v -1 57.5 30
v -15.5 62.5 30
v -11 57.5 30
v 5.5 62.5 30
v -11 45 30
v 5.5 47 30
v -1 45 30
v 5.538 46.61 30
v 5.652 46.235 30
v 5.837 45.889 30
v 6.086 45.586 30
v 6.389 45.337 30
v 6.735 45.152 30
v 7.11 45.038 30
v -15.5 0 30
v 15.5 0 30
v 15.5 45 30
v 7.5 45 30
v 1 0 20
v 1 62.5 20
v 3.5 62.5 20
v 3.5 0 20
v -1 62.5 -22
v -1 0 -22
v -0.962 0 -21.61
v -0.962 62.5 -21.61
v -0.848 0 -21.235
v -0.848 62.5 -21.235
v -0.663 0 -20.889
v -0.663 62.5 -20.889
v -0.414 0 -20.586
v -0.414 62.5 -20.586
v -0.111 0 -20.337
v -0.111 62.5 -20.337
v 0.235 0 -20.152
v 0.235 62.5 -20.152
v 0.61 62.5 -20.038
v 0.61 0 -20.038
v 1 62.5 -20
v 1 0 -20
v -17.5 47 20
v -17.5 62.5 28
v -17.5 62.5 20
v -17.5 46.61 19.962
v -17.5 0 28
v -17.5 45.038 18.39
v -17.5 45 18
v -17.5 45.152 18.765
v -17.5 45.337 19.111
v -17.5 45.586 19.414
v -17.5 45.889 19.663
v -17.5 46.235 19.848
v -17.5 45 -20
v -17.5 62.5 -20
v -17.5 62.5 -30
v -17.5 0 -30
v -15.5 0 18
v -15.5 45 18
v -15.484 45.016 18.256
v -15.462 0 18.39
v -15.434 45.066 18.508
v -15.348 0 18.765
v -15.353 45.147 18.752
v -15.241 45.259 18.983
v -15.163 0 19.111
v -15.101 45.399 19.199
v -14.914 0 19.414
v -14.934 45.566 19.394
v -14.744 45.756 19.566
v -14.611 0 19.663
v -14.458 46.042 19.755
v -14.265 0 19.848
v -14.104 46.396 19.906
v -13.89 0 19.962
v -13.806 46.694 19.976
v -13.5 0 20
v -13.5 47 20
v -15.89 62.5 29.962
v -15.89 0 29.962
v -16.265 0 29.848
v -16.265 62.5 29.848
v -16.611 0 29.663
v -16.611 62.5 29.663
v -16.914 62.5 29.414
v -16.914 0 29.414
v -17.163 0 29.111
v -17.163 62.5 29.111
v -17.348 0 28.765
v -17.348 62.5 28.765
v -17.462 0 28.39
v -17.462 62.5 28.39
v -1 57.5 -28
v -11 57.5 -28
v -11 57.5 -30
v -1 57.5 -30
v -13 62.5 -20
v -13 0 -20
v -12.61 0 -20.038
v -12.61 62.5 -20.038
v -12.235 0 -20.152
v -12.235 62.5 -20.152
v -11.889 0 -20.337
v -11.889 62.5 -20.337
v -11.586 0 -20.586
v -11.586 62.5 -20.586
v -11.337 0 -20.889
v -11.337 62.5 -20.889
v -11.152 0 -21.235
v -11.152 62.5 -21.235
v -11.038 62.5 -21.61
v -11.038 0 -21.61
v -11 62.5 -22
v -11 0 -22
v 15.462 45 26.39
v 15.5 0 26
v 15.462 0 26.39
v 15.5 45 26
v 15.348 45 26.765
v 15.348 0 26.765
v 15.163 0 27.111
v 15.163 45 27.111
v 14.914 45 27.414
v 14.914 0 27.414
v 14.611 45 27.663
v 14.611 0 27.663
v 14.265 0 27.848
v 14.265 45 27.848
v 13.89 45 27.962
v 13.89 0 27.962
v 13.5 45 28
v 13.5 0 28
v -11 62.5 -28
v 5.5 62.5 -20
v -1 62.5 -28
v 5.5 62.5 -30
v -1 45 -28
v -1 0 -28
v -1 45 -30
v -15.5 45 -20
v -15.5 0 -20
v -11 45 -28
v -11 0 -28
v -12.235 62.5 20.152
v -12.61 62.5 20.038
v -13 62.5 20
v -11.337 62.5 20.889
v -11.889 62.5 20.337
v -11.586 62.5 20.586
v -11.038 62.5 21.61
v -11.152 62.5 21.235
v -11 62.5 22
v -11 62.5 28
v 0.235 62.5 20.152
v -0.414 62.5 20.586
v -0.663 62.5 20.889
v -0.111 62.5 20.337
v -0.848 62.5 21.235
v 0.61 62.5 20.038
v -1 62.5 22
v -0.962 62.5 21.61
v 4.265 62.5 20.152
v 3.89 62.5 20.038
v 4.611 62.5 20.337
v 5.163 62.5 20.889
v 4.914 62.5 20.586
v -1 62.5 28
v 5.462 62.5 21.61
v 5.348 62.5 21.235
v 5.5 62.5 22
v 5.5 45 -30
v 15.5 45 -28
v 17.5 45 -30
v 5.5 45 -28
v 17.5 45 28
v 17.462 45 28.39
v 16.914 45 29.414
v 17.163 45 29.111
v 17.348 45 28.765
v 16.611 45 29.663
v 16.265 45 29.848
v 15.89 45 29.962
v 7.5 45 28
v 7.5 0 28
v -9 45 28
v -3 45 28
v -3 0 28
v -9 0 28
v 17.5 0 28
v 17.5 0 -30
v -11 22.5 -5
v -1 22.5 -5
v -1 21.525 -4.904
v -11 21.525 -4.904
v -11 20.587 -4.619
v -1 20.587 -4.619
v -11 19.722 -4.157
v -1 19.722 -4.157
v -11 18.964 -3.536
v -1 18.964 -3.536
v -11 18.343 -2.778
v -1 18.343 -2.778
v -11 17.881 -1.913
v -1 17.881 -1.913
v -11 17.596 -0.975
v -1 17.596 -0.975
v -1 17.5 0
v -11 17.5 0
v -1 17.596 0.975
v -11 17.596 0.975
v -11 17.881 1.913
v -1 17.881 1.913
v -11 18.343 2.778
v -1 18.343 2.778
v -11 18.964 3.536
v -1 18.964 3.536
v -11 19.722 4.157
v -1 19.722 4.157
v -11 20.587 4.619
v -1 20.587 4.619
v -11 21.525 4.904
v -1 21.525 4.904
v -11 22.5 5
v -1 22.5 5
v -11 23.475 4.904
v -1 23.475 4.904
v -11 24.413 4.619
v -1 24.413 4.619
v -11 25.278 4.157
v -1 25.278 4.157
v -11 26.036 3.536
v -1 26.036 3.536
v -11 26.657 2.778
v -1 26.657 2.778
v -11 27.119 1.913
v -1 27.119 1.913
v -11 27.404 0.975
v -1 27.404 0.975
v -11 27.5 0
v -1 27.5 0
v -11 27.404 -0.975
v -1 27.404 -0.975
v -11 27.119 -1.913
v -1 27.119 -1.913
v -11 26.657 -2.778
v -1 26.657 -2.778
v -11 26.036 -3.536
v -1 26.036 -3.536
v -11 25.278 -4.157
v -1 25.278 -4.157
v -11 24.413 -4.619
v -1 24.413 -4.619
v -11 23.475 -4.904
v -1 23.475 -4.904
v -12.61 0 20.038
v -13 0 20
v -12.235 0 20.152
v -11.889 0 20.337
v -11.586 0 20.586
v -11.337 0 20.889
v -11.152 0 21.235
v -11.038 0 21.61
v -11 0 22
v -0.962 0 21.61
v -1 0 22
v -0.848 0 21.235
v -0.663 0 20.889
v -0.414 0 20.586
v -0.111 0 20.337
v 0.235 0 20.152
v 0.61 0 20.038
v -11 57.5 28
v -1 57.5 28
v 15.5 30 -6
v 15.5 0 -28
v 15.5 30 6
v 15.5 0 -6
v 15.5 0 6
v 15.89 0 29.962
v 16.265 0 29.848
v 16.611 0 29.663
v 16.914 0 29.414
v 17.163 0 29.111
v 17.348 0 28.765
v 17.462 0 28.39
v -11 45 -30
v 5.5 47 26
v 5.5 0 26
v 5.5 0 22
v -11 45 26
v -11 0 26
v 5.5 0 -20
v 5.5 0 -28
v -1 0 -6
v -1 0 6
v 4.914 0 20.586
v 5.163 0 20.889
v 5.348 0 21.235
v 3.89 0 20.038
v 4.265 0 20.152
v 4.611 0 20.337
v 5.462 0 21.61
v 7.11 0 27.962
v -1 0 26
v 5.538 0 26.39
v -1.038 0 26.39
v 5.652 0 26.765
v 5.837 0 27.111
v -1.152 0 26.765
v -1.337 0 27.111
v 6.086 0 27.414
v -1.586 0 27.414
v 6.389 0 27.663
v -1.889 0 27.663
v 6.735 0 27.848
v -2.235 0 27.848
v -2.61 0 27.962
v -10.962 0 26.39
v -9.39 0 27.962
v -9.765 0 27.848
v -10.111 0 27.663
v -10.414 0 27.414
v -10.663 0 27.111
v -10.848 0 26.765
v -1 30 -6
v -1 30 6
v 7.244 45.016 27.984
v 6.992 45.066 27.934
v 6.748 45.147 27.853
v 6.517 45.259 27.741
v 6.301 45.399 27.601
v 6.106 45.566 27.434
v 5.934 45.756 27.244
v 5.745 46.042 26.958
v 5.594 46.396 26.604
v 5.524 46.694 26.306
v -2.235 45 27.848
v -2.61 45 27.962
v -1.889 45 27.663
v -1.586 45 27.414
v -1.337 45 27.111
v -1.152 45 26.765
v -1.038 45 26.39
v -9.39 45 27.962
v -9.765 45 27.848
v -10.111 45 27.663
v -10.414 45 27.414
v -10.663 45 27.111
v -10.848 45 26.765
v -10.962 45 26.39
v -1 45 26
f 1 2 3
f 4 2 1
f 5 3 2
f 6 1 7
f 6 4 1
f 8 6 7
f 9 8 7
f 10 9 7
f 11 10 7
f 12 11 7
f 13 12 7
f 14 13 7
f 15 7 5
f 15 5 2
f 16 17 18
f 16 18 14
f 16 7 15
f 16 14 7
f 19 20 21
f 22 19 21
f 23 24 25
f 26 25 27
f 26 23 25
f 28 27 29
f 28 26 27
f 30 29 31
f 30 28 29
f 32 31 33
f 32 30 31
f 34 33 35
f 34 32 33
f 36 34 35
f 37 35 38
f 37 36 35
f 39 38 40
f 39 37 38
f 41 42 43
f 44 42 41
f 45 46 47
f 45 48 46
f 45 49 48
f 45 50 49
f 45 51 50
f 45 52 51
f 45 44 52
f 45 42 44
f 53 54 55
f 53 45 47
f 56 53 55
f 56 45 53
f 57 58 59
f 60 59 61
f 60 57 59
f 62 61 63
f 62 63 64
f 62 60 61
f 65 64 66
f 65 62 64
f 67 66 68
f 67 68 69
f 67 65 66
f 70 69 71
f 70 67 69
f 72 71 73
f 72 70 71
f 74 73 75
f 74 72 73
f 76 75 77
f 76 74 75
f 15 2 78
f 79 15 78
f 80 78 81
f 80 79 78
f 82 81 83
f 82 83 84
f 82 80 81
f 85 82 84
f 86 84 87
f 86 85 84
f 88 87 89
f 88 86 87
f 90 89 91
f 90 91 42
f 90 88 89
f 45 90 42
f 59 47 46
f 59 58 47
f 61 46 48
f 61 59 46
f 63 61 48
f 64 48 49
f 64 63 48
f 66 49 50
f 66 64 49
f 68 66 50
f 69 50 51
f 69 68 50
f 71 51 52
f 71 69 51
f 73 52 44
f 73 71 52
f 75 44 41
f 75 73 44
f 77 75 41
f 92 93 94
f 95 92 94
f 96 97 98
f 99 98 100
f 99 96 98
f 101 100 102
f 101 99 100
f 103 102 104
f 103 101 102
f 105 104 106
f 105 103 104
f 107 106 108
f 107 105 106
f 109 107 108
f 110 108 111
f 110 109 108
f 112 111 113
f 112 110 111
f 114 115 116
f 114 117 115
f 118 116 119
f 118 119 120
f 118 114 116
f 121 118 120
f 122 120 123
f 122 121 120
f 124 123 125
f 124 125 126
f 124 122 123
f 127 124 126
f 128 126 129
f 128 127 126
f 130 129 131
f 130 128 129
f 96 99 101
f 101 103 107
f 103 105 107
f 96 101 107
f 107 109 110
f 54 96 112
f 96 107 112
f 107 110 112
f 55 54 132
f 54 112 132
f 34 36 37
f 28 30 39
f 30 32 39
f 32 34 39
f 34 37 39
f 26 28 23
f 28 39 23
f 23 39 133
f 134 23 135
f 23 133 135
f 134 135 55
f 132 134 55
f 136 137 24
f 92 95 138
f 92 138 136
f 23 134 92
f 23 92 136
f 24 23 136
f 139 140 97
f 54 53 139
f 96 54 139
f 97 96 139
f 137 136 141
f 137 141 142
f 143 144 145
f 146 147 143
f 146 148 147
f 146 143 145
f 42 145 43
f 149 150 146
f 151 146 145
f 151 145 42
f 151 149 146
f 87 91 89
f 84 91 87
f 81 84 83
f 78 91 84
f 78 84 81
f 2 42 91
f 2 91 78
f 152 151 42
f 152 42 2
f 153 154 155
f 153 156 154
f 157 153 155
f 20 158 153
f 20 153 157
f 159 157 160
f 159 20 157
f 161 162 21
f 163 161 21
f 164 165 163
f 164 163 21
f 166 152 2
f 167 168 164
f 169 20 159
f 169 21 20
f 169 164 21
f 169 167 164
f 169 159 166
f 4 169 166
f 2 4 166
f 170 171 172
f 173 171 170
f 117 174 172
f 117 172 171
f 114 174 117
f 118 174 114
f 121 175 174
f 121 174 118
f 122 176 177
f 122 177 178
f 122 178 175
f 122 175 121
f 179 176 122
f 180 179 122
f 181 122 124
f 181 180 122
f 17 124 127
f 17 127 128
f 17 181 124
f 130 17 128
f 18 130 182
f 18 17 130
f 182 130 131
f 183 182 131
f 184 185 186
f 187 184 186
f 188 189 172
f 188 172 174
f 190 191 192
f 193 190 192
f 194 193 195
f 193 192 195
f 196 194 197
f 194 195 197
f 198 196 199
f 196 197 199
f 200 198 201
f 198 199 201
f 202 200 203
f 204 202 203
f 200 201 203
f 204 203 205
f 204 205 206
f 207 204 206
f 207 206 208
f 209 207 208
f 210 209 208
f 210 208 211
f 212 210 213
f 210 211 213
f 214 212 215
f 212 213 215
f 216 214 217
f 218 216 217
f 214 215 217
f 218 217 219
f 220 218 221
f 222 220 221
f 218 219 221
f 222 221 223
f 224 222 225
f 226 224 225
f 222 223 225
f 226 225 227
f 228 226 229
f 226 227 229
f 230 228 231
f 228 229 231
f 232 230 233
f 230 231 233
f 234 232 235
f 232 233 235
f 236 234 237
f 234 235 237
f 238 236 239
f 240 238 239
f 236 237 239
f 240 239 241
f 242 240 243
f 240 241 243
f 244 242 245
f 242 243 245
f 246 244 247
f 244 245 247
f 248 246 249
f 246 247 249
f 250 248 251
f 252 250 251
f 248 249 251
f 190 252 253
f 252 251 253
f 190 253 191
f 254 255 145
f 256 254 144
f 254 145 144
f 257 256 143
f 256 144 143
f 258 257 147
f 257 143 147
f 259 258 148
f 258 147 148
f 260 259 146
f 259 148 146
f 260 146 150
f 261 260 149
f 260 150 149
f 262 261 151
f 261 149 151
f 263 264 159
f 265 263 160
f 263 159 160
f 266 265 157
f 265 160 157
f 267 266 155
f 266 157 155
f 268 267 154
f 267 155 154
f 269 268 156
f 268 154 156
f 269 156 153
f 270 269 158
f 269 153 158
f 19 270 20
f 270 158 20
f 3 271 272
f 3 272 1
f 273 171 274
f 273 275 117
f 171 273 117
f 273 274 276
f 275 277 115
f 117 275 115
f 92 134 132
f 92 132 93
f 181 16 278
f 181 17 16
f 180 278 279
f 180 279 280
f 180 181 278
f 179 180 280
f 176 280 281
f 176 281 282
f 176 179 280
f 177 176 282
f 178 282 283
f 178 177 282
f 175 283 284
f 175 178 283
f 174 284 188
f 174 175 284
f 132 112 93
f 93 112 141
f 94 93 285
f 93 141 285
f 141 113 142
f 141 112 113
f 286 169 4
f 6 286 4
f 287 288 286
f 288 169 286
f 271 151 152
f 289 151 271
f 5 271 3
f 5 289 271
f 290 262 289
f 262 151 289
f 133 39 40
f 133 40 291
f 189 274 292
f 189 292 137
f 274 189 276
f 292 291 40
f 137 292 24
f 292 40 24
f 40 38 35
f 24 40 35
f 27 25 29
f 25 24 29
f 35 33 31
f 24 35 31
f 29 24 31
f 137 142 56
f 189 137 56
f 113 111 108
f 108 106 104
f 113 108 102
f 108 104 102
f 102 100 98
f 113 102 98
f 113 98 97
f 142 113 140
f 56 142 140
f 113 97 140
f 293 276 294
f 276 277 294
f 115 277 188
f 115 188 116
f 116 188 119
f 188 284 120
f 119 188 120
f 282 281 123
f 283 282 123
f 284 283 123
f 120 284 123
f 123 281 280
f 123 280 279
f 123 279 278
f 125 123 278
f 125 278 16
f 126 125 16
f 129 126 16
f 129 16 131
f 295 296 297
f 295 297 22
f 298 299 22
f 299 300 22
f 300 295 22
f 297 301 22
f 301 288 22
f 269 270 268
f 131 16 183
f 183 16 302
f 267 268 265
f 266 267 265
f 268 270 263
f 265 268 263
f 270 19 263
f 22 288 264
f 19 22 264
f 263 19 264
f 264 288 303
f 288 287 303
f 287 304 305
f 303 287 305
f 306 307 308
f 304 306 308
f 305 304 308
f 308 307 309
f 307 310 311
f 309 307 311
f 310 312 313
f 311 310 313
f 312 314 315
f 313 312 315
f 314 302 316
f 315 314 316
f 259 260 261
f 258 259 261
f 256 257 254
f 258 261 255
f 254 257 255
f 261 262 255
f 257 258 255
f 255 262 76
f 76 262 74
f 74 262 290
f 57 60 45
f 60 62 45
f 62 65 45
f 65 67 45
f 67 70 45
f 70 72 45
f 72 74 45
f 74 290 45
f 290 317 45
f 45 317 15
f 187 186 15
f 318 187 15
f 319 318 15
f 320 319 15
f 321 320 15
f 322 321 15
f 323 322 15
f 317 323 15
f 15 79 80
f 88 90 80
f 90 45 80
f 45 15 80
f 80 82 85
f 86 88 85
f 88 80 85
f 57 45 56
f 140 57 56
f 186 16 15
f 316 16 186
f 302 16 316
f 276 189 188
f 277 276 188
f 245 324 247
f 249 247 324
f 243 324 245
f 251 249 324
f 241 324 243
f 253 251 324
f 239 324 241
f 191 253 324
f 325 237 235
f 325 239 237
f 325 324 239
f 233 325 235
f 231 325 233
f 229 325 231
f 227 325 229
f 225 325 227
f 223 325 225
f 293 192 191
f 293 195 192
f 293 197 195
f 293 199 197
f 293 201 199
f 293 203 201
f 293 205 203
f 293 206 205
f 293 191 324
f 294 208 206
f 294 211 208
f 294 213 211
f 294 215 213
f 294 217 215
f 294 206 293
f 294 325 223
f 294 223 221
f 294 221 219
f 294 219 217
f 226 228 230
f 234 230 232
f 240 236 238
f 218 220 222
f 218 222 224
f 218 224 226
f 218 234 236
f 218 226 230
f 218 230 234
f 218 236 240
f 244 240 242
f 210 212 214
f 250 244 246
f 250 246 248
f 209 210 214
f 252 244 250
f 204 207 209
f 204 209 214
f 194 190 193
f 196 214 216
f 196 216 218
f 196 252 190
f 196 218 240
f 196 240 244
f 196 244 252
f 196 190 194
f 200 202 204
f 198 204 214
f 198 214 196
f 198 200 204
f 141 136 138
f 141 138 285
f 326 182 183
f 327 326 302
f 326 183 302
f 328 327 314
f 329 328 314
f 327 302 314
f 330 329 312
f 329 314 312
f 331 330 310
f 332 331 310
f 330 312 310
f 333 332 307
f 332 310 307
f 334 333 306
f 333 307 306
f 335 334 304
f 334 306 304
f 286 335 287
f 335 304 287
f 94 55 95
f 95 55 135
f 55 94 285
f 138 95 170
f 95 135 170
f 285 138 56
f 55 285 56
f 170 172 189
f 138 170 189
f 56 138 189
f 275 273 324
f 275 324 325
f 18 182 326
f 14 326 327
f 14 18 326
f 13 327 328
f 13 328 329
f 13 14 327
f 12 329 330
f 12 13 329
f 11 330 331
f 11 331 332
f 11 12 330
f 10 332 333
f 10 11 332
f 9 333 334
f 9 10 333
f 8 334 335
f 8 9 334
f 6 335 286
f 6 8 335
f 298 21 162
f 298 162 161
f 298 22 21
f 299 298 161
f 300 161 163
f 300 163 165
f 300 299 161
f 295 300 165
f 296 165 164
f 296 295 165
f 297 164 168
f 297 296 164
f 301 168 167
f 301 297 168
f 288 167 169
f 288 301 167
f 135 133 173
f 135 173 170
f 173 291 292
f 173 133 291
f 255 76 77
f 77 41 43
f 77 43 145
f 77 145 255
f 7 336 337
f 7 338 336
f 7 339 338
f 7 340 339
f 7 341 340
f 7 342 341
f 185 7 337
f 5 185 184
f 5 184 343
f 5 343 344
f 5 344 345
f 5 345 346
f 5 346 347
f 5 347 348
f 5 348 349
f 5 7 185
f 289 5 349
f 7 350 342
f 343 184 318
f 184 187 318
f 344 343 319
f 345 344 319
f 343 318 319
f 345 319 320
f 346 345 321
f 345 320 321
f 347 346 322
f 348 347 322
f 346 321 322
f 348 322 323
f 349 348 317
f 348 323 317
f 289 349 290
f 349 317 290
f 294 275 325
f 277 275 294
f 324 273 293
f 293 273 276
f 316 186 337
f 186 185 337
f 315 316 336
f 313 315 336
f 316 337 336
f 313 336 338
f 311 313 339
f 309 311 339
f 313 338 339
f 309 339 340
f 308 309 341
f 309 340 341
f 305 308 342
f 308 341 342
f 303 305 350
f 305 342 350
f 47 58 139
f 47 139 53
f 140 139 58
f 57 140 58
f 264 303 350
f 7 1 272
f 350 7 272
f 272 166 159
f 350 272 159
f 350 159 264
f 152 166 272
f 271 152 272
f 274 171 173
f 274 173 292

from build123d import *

# Parameters (mm, degrees)
SKETCH1_W           = 35
SKETCH1_H           = 60
SKETCH1_W_2         = 31
SKETCH1_H_2         = 56
BOSS_EXTRUDE1_DEPTH = 45
SKETCH2_W           = 30
SKETCH2_H           = 12
BOSS_EXTRUDE2_DEPTH = 16.5
SKETCH3_R           = 5
BOSS_EXTRUDE3_DEPTH = 10
SKETCH4_W           = 6.5
SKETCH4_H           = 2
BOSS_EXTRUDE4_DEPTH = 17.5
BOSS_EXTRUDE5_REACH = 73.753
SKETCH5_W           = 5
SKETCH5_H           = 2
BOSS_EXTRUDE6_REACH = 73.502
FILLET1_R           = 2


with BuildPart() as part:
    # Sketch1 → Boss-Extrude1 (new body)
    with BuildSketch(Plane(origin=(0, 0, 0), x_dir=(-1, 0, 0), z_dir=(0, 1, 0))):
        Rectangle(SKETCH1_W, SKETCH1_H)
        Rectangle(SKETCH1_W_2, SKETCH1_H_2, mode=Mode.SUBTRACT)
    extrude(amount=BOSS_EXTRUDE1_DEPTH)

    # Sketch2 → Boss-Extrude2 (add)
    with BuildSketch(Plane(origin=(15.5, 0, 0), x_dir=(0, -1, 0), z_dir=(-1, 0, 0))):
        with Locations((-15, 0)):
            Rectangle(SKETCH2_W, SKETCH2_H)
    extrude(amount=BOSS_EXTRUDE2_DEPTH)

    # Sketch3 → Boss-Extrude3 (add)
    with BuildSketch(Plane(origin=(-1, 0, 0), x_dir=(0, -1, 0), z_dir=(-1, 0, 0))):
        with Locations(Location((-22.5, 0, 0), (0, 0, 270))):
            Circle(SKETCH3_R)
    extrude(amount=BOSS_EXTRUDE3_DEPTH)

    # Sketch4 → Boss-Extrude4 (add)
    with BuildSketch(Plane(origin=(0, 45, 0), x_dir=(-1, 0, 0), z_dir=(0, 1, 0))):
        with Locations((14.25, 29)):
            Rectangle(SKETCH4_W, SKETCH4_H)
        with Locations((-2.25, 29)):
            Rectangle(SKETCH4_W, SKETCH4_H)
    boss_extrude4 = extrude(amount=BOSS_EXTRUDE4_DEPTH)

    # Sketch5 → Boss-Extrude5 (add, up to next)
    with BuildSketch(Plane(origin=(-1, 0, 0), x_dir=(0, -1, 0), z_dir=(-1, 0, 0)), mode=Mode.PRIVATE) as boss_extrude5_sk1:
        with Locations((-60, 29)):
            Rectangle(SKETCH5_W, SKETCH5_H)
    boss_extrude5_tool1 = extrude(boss_extrude5_sk1.sketch, amount=BOSS_EXTRUDE5_REACH, mode=Mode.PRIVATE) - part.part
    boss_extrude5 = boss_extrude5_tool1.solids().sort_by_distance((-1, 60, 29))[0]
    add(boss_extrude5)

    # Mirror1: Boss-Extrude4, Boss-Extrude5 across plane
    add(boss_extrude4.mirror(Plane.XY))
    add(boss_extrude5.mirror(Plane.XY))

    # Boss-Extrude6: up to this face of the body (flat: up to its plane)
    boss_extrude6_end = Plane(part.part.faces().sort_by_distance((2.554270463, 0, 0))[0])
    # Sketch7 → Boss-Extrude6 (add, up to the picked face)
    with BuildSketch(Plane(origin=(0, 62.5, 0), x_dir=(-1, 0, 0), z_dir=(0, 1, 0)), mode=Mode.PRIVATE) as boss_extrude6_sk1:
        with BuildLine():
            Line((11, 30), (17.5, 30))
            Line((17.5, 30), (17.5, 20))
            Line((17.5, 20), (13, 20))
            ThreePointArc((13, 20), (11.585786438, 20.585786438), (11, 22))
            Line((11, 22), (11, 30))
        make_face()
    boss_extrude6_tool1 = split(extrude(boss_extrude6_sk1.sketch, amount=-BOSS_EXTRUDE6_REACH, mode=Mode.PRIVATE), bisect_by=boss_extrude6_end, keep=Keep.BOTH, mode=Mode.PRIVATE)
    # Sketch7 → Boss-Extrude6 (add, up to the picked face)
    with BuildSketch(Plane(origin=(0, 62.5, 0), x_dir=(-1, 0, 0), z_dir=(0, 1, 0)), mode=Mode.PRIVATE) as boss_extrude6_sk2:
        with BuildLine():
            Line((-5.5, 30), (1, 30))
            Line((1, 30), (1, 22))
            ThreePointArc((1, 22), (0.414213562, 20.585786438), (-1, 20))
            Line((-1, 20), (-5.5, 20))
            Line((-5.5, 20), (-5.5, 30))
        make_face()
    boss_extrude6_tool2 = split(extrude(boss_extrude6_sk2.sketch, amount=-BOSS_EXTRUDE6_REACH, mode=Mode.PRIVATE), bisect_by=boss_extrude6_end, keep=Keep.BOTH, mode=Mode.PRIVATE)
    boss_extrude6_1 = boss_extrude6_tool1.solids().sort_by(Axis((-14.287516, 62.5, 25.060936), (0, -1, 0)))[0]
    add(boss_extrude6_1)
    boss_extrude6_2 = boss_extrude6_tool2.solids().sort_by(Axis((2.287516, 62.5, 25.060936), (0, -1, 0)))[0]
    add(boss_extrude6_2)
    boss_extrude6 = boss_extrude6_1 + boss_extrude6_2  # Boss-Extrude6 as one shape, for the pattern or mirror that repeats it

    # Fillet1
    fillet1_edges = [part.edges().sort_by_distance(p)[0] for p in [
        (-15.5, 22.5, 20),
        (-16.5, 45, 20),
        (-11, 22.5, 28),
        (-1, 22.5, 28),
        (5.5, 22.5, 28),
        (5.5, 31.25, 20),
        (15.5, 22.5, 28),
        (5.5, 45, 29),
        (17.5, 22.5, 30),
        (-17.5, 31.25, 30),
    ]]
    fillet(fillet1_edges, radius=FILLET1_R)

    # Mirror2: Boss-Extrude4, Boss-Extrude5, Boss-Extrude6 across plane
    add(boss_extrude4.mirror(Plane.XY))
    add(boss_extrude5.mirror(Plane.XY))
    add(boss_extrude6.mirror(Plane.XY))


solid = part.part
